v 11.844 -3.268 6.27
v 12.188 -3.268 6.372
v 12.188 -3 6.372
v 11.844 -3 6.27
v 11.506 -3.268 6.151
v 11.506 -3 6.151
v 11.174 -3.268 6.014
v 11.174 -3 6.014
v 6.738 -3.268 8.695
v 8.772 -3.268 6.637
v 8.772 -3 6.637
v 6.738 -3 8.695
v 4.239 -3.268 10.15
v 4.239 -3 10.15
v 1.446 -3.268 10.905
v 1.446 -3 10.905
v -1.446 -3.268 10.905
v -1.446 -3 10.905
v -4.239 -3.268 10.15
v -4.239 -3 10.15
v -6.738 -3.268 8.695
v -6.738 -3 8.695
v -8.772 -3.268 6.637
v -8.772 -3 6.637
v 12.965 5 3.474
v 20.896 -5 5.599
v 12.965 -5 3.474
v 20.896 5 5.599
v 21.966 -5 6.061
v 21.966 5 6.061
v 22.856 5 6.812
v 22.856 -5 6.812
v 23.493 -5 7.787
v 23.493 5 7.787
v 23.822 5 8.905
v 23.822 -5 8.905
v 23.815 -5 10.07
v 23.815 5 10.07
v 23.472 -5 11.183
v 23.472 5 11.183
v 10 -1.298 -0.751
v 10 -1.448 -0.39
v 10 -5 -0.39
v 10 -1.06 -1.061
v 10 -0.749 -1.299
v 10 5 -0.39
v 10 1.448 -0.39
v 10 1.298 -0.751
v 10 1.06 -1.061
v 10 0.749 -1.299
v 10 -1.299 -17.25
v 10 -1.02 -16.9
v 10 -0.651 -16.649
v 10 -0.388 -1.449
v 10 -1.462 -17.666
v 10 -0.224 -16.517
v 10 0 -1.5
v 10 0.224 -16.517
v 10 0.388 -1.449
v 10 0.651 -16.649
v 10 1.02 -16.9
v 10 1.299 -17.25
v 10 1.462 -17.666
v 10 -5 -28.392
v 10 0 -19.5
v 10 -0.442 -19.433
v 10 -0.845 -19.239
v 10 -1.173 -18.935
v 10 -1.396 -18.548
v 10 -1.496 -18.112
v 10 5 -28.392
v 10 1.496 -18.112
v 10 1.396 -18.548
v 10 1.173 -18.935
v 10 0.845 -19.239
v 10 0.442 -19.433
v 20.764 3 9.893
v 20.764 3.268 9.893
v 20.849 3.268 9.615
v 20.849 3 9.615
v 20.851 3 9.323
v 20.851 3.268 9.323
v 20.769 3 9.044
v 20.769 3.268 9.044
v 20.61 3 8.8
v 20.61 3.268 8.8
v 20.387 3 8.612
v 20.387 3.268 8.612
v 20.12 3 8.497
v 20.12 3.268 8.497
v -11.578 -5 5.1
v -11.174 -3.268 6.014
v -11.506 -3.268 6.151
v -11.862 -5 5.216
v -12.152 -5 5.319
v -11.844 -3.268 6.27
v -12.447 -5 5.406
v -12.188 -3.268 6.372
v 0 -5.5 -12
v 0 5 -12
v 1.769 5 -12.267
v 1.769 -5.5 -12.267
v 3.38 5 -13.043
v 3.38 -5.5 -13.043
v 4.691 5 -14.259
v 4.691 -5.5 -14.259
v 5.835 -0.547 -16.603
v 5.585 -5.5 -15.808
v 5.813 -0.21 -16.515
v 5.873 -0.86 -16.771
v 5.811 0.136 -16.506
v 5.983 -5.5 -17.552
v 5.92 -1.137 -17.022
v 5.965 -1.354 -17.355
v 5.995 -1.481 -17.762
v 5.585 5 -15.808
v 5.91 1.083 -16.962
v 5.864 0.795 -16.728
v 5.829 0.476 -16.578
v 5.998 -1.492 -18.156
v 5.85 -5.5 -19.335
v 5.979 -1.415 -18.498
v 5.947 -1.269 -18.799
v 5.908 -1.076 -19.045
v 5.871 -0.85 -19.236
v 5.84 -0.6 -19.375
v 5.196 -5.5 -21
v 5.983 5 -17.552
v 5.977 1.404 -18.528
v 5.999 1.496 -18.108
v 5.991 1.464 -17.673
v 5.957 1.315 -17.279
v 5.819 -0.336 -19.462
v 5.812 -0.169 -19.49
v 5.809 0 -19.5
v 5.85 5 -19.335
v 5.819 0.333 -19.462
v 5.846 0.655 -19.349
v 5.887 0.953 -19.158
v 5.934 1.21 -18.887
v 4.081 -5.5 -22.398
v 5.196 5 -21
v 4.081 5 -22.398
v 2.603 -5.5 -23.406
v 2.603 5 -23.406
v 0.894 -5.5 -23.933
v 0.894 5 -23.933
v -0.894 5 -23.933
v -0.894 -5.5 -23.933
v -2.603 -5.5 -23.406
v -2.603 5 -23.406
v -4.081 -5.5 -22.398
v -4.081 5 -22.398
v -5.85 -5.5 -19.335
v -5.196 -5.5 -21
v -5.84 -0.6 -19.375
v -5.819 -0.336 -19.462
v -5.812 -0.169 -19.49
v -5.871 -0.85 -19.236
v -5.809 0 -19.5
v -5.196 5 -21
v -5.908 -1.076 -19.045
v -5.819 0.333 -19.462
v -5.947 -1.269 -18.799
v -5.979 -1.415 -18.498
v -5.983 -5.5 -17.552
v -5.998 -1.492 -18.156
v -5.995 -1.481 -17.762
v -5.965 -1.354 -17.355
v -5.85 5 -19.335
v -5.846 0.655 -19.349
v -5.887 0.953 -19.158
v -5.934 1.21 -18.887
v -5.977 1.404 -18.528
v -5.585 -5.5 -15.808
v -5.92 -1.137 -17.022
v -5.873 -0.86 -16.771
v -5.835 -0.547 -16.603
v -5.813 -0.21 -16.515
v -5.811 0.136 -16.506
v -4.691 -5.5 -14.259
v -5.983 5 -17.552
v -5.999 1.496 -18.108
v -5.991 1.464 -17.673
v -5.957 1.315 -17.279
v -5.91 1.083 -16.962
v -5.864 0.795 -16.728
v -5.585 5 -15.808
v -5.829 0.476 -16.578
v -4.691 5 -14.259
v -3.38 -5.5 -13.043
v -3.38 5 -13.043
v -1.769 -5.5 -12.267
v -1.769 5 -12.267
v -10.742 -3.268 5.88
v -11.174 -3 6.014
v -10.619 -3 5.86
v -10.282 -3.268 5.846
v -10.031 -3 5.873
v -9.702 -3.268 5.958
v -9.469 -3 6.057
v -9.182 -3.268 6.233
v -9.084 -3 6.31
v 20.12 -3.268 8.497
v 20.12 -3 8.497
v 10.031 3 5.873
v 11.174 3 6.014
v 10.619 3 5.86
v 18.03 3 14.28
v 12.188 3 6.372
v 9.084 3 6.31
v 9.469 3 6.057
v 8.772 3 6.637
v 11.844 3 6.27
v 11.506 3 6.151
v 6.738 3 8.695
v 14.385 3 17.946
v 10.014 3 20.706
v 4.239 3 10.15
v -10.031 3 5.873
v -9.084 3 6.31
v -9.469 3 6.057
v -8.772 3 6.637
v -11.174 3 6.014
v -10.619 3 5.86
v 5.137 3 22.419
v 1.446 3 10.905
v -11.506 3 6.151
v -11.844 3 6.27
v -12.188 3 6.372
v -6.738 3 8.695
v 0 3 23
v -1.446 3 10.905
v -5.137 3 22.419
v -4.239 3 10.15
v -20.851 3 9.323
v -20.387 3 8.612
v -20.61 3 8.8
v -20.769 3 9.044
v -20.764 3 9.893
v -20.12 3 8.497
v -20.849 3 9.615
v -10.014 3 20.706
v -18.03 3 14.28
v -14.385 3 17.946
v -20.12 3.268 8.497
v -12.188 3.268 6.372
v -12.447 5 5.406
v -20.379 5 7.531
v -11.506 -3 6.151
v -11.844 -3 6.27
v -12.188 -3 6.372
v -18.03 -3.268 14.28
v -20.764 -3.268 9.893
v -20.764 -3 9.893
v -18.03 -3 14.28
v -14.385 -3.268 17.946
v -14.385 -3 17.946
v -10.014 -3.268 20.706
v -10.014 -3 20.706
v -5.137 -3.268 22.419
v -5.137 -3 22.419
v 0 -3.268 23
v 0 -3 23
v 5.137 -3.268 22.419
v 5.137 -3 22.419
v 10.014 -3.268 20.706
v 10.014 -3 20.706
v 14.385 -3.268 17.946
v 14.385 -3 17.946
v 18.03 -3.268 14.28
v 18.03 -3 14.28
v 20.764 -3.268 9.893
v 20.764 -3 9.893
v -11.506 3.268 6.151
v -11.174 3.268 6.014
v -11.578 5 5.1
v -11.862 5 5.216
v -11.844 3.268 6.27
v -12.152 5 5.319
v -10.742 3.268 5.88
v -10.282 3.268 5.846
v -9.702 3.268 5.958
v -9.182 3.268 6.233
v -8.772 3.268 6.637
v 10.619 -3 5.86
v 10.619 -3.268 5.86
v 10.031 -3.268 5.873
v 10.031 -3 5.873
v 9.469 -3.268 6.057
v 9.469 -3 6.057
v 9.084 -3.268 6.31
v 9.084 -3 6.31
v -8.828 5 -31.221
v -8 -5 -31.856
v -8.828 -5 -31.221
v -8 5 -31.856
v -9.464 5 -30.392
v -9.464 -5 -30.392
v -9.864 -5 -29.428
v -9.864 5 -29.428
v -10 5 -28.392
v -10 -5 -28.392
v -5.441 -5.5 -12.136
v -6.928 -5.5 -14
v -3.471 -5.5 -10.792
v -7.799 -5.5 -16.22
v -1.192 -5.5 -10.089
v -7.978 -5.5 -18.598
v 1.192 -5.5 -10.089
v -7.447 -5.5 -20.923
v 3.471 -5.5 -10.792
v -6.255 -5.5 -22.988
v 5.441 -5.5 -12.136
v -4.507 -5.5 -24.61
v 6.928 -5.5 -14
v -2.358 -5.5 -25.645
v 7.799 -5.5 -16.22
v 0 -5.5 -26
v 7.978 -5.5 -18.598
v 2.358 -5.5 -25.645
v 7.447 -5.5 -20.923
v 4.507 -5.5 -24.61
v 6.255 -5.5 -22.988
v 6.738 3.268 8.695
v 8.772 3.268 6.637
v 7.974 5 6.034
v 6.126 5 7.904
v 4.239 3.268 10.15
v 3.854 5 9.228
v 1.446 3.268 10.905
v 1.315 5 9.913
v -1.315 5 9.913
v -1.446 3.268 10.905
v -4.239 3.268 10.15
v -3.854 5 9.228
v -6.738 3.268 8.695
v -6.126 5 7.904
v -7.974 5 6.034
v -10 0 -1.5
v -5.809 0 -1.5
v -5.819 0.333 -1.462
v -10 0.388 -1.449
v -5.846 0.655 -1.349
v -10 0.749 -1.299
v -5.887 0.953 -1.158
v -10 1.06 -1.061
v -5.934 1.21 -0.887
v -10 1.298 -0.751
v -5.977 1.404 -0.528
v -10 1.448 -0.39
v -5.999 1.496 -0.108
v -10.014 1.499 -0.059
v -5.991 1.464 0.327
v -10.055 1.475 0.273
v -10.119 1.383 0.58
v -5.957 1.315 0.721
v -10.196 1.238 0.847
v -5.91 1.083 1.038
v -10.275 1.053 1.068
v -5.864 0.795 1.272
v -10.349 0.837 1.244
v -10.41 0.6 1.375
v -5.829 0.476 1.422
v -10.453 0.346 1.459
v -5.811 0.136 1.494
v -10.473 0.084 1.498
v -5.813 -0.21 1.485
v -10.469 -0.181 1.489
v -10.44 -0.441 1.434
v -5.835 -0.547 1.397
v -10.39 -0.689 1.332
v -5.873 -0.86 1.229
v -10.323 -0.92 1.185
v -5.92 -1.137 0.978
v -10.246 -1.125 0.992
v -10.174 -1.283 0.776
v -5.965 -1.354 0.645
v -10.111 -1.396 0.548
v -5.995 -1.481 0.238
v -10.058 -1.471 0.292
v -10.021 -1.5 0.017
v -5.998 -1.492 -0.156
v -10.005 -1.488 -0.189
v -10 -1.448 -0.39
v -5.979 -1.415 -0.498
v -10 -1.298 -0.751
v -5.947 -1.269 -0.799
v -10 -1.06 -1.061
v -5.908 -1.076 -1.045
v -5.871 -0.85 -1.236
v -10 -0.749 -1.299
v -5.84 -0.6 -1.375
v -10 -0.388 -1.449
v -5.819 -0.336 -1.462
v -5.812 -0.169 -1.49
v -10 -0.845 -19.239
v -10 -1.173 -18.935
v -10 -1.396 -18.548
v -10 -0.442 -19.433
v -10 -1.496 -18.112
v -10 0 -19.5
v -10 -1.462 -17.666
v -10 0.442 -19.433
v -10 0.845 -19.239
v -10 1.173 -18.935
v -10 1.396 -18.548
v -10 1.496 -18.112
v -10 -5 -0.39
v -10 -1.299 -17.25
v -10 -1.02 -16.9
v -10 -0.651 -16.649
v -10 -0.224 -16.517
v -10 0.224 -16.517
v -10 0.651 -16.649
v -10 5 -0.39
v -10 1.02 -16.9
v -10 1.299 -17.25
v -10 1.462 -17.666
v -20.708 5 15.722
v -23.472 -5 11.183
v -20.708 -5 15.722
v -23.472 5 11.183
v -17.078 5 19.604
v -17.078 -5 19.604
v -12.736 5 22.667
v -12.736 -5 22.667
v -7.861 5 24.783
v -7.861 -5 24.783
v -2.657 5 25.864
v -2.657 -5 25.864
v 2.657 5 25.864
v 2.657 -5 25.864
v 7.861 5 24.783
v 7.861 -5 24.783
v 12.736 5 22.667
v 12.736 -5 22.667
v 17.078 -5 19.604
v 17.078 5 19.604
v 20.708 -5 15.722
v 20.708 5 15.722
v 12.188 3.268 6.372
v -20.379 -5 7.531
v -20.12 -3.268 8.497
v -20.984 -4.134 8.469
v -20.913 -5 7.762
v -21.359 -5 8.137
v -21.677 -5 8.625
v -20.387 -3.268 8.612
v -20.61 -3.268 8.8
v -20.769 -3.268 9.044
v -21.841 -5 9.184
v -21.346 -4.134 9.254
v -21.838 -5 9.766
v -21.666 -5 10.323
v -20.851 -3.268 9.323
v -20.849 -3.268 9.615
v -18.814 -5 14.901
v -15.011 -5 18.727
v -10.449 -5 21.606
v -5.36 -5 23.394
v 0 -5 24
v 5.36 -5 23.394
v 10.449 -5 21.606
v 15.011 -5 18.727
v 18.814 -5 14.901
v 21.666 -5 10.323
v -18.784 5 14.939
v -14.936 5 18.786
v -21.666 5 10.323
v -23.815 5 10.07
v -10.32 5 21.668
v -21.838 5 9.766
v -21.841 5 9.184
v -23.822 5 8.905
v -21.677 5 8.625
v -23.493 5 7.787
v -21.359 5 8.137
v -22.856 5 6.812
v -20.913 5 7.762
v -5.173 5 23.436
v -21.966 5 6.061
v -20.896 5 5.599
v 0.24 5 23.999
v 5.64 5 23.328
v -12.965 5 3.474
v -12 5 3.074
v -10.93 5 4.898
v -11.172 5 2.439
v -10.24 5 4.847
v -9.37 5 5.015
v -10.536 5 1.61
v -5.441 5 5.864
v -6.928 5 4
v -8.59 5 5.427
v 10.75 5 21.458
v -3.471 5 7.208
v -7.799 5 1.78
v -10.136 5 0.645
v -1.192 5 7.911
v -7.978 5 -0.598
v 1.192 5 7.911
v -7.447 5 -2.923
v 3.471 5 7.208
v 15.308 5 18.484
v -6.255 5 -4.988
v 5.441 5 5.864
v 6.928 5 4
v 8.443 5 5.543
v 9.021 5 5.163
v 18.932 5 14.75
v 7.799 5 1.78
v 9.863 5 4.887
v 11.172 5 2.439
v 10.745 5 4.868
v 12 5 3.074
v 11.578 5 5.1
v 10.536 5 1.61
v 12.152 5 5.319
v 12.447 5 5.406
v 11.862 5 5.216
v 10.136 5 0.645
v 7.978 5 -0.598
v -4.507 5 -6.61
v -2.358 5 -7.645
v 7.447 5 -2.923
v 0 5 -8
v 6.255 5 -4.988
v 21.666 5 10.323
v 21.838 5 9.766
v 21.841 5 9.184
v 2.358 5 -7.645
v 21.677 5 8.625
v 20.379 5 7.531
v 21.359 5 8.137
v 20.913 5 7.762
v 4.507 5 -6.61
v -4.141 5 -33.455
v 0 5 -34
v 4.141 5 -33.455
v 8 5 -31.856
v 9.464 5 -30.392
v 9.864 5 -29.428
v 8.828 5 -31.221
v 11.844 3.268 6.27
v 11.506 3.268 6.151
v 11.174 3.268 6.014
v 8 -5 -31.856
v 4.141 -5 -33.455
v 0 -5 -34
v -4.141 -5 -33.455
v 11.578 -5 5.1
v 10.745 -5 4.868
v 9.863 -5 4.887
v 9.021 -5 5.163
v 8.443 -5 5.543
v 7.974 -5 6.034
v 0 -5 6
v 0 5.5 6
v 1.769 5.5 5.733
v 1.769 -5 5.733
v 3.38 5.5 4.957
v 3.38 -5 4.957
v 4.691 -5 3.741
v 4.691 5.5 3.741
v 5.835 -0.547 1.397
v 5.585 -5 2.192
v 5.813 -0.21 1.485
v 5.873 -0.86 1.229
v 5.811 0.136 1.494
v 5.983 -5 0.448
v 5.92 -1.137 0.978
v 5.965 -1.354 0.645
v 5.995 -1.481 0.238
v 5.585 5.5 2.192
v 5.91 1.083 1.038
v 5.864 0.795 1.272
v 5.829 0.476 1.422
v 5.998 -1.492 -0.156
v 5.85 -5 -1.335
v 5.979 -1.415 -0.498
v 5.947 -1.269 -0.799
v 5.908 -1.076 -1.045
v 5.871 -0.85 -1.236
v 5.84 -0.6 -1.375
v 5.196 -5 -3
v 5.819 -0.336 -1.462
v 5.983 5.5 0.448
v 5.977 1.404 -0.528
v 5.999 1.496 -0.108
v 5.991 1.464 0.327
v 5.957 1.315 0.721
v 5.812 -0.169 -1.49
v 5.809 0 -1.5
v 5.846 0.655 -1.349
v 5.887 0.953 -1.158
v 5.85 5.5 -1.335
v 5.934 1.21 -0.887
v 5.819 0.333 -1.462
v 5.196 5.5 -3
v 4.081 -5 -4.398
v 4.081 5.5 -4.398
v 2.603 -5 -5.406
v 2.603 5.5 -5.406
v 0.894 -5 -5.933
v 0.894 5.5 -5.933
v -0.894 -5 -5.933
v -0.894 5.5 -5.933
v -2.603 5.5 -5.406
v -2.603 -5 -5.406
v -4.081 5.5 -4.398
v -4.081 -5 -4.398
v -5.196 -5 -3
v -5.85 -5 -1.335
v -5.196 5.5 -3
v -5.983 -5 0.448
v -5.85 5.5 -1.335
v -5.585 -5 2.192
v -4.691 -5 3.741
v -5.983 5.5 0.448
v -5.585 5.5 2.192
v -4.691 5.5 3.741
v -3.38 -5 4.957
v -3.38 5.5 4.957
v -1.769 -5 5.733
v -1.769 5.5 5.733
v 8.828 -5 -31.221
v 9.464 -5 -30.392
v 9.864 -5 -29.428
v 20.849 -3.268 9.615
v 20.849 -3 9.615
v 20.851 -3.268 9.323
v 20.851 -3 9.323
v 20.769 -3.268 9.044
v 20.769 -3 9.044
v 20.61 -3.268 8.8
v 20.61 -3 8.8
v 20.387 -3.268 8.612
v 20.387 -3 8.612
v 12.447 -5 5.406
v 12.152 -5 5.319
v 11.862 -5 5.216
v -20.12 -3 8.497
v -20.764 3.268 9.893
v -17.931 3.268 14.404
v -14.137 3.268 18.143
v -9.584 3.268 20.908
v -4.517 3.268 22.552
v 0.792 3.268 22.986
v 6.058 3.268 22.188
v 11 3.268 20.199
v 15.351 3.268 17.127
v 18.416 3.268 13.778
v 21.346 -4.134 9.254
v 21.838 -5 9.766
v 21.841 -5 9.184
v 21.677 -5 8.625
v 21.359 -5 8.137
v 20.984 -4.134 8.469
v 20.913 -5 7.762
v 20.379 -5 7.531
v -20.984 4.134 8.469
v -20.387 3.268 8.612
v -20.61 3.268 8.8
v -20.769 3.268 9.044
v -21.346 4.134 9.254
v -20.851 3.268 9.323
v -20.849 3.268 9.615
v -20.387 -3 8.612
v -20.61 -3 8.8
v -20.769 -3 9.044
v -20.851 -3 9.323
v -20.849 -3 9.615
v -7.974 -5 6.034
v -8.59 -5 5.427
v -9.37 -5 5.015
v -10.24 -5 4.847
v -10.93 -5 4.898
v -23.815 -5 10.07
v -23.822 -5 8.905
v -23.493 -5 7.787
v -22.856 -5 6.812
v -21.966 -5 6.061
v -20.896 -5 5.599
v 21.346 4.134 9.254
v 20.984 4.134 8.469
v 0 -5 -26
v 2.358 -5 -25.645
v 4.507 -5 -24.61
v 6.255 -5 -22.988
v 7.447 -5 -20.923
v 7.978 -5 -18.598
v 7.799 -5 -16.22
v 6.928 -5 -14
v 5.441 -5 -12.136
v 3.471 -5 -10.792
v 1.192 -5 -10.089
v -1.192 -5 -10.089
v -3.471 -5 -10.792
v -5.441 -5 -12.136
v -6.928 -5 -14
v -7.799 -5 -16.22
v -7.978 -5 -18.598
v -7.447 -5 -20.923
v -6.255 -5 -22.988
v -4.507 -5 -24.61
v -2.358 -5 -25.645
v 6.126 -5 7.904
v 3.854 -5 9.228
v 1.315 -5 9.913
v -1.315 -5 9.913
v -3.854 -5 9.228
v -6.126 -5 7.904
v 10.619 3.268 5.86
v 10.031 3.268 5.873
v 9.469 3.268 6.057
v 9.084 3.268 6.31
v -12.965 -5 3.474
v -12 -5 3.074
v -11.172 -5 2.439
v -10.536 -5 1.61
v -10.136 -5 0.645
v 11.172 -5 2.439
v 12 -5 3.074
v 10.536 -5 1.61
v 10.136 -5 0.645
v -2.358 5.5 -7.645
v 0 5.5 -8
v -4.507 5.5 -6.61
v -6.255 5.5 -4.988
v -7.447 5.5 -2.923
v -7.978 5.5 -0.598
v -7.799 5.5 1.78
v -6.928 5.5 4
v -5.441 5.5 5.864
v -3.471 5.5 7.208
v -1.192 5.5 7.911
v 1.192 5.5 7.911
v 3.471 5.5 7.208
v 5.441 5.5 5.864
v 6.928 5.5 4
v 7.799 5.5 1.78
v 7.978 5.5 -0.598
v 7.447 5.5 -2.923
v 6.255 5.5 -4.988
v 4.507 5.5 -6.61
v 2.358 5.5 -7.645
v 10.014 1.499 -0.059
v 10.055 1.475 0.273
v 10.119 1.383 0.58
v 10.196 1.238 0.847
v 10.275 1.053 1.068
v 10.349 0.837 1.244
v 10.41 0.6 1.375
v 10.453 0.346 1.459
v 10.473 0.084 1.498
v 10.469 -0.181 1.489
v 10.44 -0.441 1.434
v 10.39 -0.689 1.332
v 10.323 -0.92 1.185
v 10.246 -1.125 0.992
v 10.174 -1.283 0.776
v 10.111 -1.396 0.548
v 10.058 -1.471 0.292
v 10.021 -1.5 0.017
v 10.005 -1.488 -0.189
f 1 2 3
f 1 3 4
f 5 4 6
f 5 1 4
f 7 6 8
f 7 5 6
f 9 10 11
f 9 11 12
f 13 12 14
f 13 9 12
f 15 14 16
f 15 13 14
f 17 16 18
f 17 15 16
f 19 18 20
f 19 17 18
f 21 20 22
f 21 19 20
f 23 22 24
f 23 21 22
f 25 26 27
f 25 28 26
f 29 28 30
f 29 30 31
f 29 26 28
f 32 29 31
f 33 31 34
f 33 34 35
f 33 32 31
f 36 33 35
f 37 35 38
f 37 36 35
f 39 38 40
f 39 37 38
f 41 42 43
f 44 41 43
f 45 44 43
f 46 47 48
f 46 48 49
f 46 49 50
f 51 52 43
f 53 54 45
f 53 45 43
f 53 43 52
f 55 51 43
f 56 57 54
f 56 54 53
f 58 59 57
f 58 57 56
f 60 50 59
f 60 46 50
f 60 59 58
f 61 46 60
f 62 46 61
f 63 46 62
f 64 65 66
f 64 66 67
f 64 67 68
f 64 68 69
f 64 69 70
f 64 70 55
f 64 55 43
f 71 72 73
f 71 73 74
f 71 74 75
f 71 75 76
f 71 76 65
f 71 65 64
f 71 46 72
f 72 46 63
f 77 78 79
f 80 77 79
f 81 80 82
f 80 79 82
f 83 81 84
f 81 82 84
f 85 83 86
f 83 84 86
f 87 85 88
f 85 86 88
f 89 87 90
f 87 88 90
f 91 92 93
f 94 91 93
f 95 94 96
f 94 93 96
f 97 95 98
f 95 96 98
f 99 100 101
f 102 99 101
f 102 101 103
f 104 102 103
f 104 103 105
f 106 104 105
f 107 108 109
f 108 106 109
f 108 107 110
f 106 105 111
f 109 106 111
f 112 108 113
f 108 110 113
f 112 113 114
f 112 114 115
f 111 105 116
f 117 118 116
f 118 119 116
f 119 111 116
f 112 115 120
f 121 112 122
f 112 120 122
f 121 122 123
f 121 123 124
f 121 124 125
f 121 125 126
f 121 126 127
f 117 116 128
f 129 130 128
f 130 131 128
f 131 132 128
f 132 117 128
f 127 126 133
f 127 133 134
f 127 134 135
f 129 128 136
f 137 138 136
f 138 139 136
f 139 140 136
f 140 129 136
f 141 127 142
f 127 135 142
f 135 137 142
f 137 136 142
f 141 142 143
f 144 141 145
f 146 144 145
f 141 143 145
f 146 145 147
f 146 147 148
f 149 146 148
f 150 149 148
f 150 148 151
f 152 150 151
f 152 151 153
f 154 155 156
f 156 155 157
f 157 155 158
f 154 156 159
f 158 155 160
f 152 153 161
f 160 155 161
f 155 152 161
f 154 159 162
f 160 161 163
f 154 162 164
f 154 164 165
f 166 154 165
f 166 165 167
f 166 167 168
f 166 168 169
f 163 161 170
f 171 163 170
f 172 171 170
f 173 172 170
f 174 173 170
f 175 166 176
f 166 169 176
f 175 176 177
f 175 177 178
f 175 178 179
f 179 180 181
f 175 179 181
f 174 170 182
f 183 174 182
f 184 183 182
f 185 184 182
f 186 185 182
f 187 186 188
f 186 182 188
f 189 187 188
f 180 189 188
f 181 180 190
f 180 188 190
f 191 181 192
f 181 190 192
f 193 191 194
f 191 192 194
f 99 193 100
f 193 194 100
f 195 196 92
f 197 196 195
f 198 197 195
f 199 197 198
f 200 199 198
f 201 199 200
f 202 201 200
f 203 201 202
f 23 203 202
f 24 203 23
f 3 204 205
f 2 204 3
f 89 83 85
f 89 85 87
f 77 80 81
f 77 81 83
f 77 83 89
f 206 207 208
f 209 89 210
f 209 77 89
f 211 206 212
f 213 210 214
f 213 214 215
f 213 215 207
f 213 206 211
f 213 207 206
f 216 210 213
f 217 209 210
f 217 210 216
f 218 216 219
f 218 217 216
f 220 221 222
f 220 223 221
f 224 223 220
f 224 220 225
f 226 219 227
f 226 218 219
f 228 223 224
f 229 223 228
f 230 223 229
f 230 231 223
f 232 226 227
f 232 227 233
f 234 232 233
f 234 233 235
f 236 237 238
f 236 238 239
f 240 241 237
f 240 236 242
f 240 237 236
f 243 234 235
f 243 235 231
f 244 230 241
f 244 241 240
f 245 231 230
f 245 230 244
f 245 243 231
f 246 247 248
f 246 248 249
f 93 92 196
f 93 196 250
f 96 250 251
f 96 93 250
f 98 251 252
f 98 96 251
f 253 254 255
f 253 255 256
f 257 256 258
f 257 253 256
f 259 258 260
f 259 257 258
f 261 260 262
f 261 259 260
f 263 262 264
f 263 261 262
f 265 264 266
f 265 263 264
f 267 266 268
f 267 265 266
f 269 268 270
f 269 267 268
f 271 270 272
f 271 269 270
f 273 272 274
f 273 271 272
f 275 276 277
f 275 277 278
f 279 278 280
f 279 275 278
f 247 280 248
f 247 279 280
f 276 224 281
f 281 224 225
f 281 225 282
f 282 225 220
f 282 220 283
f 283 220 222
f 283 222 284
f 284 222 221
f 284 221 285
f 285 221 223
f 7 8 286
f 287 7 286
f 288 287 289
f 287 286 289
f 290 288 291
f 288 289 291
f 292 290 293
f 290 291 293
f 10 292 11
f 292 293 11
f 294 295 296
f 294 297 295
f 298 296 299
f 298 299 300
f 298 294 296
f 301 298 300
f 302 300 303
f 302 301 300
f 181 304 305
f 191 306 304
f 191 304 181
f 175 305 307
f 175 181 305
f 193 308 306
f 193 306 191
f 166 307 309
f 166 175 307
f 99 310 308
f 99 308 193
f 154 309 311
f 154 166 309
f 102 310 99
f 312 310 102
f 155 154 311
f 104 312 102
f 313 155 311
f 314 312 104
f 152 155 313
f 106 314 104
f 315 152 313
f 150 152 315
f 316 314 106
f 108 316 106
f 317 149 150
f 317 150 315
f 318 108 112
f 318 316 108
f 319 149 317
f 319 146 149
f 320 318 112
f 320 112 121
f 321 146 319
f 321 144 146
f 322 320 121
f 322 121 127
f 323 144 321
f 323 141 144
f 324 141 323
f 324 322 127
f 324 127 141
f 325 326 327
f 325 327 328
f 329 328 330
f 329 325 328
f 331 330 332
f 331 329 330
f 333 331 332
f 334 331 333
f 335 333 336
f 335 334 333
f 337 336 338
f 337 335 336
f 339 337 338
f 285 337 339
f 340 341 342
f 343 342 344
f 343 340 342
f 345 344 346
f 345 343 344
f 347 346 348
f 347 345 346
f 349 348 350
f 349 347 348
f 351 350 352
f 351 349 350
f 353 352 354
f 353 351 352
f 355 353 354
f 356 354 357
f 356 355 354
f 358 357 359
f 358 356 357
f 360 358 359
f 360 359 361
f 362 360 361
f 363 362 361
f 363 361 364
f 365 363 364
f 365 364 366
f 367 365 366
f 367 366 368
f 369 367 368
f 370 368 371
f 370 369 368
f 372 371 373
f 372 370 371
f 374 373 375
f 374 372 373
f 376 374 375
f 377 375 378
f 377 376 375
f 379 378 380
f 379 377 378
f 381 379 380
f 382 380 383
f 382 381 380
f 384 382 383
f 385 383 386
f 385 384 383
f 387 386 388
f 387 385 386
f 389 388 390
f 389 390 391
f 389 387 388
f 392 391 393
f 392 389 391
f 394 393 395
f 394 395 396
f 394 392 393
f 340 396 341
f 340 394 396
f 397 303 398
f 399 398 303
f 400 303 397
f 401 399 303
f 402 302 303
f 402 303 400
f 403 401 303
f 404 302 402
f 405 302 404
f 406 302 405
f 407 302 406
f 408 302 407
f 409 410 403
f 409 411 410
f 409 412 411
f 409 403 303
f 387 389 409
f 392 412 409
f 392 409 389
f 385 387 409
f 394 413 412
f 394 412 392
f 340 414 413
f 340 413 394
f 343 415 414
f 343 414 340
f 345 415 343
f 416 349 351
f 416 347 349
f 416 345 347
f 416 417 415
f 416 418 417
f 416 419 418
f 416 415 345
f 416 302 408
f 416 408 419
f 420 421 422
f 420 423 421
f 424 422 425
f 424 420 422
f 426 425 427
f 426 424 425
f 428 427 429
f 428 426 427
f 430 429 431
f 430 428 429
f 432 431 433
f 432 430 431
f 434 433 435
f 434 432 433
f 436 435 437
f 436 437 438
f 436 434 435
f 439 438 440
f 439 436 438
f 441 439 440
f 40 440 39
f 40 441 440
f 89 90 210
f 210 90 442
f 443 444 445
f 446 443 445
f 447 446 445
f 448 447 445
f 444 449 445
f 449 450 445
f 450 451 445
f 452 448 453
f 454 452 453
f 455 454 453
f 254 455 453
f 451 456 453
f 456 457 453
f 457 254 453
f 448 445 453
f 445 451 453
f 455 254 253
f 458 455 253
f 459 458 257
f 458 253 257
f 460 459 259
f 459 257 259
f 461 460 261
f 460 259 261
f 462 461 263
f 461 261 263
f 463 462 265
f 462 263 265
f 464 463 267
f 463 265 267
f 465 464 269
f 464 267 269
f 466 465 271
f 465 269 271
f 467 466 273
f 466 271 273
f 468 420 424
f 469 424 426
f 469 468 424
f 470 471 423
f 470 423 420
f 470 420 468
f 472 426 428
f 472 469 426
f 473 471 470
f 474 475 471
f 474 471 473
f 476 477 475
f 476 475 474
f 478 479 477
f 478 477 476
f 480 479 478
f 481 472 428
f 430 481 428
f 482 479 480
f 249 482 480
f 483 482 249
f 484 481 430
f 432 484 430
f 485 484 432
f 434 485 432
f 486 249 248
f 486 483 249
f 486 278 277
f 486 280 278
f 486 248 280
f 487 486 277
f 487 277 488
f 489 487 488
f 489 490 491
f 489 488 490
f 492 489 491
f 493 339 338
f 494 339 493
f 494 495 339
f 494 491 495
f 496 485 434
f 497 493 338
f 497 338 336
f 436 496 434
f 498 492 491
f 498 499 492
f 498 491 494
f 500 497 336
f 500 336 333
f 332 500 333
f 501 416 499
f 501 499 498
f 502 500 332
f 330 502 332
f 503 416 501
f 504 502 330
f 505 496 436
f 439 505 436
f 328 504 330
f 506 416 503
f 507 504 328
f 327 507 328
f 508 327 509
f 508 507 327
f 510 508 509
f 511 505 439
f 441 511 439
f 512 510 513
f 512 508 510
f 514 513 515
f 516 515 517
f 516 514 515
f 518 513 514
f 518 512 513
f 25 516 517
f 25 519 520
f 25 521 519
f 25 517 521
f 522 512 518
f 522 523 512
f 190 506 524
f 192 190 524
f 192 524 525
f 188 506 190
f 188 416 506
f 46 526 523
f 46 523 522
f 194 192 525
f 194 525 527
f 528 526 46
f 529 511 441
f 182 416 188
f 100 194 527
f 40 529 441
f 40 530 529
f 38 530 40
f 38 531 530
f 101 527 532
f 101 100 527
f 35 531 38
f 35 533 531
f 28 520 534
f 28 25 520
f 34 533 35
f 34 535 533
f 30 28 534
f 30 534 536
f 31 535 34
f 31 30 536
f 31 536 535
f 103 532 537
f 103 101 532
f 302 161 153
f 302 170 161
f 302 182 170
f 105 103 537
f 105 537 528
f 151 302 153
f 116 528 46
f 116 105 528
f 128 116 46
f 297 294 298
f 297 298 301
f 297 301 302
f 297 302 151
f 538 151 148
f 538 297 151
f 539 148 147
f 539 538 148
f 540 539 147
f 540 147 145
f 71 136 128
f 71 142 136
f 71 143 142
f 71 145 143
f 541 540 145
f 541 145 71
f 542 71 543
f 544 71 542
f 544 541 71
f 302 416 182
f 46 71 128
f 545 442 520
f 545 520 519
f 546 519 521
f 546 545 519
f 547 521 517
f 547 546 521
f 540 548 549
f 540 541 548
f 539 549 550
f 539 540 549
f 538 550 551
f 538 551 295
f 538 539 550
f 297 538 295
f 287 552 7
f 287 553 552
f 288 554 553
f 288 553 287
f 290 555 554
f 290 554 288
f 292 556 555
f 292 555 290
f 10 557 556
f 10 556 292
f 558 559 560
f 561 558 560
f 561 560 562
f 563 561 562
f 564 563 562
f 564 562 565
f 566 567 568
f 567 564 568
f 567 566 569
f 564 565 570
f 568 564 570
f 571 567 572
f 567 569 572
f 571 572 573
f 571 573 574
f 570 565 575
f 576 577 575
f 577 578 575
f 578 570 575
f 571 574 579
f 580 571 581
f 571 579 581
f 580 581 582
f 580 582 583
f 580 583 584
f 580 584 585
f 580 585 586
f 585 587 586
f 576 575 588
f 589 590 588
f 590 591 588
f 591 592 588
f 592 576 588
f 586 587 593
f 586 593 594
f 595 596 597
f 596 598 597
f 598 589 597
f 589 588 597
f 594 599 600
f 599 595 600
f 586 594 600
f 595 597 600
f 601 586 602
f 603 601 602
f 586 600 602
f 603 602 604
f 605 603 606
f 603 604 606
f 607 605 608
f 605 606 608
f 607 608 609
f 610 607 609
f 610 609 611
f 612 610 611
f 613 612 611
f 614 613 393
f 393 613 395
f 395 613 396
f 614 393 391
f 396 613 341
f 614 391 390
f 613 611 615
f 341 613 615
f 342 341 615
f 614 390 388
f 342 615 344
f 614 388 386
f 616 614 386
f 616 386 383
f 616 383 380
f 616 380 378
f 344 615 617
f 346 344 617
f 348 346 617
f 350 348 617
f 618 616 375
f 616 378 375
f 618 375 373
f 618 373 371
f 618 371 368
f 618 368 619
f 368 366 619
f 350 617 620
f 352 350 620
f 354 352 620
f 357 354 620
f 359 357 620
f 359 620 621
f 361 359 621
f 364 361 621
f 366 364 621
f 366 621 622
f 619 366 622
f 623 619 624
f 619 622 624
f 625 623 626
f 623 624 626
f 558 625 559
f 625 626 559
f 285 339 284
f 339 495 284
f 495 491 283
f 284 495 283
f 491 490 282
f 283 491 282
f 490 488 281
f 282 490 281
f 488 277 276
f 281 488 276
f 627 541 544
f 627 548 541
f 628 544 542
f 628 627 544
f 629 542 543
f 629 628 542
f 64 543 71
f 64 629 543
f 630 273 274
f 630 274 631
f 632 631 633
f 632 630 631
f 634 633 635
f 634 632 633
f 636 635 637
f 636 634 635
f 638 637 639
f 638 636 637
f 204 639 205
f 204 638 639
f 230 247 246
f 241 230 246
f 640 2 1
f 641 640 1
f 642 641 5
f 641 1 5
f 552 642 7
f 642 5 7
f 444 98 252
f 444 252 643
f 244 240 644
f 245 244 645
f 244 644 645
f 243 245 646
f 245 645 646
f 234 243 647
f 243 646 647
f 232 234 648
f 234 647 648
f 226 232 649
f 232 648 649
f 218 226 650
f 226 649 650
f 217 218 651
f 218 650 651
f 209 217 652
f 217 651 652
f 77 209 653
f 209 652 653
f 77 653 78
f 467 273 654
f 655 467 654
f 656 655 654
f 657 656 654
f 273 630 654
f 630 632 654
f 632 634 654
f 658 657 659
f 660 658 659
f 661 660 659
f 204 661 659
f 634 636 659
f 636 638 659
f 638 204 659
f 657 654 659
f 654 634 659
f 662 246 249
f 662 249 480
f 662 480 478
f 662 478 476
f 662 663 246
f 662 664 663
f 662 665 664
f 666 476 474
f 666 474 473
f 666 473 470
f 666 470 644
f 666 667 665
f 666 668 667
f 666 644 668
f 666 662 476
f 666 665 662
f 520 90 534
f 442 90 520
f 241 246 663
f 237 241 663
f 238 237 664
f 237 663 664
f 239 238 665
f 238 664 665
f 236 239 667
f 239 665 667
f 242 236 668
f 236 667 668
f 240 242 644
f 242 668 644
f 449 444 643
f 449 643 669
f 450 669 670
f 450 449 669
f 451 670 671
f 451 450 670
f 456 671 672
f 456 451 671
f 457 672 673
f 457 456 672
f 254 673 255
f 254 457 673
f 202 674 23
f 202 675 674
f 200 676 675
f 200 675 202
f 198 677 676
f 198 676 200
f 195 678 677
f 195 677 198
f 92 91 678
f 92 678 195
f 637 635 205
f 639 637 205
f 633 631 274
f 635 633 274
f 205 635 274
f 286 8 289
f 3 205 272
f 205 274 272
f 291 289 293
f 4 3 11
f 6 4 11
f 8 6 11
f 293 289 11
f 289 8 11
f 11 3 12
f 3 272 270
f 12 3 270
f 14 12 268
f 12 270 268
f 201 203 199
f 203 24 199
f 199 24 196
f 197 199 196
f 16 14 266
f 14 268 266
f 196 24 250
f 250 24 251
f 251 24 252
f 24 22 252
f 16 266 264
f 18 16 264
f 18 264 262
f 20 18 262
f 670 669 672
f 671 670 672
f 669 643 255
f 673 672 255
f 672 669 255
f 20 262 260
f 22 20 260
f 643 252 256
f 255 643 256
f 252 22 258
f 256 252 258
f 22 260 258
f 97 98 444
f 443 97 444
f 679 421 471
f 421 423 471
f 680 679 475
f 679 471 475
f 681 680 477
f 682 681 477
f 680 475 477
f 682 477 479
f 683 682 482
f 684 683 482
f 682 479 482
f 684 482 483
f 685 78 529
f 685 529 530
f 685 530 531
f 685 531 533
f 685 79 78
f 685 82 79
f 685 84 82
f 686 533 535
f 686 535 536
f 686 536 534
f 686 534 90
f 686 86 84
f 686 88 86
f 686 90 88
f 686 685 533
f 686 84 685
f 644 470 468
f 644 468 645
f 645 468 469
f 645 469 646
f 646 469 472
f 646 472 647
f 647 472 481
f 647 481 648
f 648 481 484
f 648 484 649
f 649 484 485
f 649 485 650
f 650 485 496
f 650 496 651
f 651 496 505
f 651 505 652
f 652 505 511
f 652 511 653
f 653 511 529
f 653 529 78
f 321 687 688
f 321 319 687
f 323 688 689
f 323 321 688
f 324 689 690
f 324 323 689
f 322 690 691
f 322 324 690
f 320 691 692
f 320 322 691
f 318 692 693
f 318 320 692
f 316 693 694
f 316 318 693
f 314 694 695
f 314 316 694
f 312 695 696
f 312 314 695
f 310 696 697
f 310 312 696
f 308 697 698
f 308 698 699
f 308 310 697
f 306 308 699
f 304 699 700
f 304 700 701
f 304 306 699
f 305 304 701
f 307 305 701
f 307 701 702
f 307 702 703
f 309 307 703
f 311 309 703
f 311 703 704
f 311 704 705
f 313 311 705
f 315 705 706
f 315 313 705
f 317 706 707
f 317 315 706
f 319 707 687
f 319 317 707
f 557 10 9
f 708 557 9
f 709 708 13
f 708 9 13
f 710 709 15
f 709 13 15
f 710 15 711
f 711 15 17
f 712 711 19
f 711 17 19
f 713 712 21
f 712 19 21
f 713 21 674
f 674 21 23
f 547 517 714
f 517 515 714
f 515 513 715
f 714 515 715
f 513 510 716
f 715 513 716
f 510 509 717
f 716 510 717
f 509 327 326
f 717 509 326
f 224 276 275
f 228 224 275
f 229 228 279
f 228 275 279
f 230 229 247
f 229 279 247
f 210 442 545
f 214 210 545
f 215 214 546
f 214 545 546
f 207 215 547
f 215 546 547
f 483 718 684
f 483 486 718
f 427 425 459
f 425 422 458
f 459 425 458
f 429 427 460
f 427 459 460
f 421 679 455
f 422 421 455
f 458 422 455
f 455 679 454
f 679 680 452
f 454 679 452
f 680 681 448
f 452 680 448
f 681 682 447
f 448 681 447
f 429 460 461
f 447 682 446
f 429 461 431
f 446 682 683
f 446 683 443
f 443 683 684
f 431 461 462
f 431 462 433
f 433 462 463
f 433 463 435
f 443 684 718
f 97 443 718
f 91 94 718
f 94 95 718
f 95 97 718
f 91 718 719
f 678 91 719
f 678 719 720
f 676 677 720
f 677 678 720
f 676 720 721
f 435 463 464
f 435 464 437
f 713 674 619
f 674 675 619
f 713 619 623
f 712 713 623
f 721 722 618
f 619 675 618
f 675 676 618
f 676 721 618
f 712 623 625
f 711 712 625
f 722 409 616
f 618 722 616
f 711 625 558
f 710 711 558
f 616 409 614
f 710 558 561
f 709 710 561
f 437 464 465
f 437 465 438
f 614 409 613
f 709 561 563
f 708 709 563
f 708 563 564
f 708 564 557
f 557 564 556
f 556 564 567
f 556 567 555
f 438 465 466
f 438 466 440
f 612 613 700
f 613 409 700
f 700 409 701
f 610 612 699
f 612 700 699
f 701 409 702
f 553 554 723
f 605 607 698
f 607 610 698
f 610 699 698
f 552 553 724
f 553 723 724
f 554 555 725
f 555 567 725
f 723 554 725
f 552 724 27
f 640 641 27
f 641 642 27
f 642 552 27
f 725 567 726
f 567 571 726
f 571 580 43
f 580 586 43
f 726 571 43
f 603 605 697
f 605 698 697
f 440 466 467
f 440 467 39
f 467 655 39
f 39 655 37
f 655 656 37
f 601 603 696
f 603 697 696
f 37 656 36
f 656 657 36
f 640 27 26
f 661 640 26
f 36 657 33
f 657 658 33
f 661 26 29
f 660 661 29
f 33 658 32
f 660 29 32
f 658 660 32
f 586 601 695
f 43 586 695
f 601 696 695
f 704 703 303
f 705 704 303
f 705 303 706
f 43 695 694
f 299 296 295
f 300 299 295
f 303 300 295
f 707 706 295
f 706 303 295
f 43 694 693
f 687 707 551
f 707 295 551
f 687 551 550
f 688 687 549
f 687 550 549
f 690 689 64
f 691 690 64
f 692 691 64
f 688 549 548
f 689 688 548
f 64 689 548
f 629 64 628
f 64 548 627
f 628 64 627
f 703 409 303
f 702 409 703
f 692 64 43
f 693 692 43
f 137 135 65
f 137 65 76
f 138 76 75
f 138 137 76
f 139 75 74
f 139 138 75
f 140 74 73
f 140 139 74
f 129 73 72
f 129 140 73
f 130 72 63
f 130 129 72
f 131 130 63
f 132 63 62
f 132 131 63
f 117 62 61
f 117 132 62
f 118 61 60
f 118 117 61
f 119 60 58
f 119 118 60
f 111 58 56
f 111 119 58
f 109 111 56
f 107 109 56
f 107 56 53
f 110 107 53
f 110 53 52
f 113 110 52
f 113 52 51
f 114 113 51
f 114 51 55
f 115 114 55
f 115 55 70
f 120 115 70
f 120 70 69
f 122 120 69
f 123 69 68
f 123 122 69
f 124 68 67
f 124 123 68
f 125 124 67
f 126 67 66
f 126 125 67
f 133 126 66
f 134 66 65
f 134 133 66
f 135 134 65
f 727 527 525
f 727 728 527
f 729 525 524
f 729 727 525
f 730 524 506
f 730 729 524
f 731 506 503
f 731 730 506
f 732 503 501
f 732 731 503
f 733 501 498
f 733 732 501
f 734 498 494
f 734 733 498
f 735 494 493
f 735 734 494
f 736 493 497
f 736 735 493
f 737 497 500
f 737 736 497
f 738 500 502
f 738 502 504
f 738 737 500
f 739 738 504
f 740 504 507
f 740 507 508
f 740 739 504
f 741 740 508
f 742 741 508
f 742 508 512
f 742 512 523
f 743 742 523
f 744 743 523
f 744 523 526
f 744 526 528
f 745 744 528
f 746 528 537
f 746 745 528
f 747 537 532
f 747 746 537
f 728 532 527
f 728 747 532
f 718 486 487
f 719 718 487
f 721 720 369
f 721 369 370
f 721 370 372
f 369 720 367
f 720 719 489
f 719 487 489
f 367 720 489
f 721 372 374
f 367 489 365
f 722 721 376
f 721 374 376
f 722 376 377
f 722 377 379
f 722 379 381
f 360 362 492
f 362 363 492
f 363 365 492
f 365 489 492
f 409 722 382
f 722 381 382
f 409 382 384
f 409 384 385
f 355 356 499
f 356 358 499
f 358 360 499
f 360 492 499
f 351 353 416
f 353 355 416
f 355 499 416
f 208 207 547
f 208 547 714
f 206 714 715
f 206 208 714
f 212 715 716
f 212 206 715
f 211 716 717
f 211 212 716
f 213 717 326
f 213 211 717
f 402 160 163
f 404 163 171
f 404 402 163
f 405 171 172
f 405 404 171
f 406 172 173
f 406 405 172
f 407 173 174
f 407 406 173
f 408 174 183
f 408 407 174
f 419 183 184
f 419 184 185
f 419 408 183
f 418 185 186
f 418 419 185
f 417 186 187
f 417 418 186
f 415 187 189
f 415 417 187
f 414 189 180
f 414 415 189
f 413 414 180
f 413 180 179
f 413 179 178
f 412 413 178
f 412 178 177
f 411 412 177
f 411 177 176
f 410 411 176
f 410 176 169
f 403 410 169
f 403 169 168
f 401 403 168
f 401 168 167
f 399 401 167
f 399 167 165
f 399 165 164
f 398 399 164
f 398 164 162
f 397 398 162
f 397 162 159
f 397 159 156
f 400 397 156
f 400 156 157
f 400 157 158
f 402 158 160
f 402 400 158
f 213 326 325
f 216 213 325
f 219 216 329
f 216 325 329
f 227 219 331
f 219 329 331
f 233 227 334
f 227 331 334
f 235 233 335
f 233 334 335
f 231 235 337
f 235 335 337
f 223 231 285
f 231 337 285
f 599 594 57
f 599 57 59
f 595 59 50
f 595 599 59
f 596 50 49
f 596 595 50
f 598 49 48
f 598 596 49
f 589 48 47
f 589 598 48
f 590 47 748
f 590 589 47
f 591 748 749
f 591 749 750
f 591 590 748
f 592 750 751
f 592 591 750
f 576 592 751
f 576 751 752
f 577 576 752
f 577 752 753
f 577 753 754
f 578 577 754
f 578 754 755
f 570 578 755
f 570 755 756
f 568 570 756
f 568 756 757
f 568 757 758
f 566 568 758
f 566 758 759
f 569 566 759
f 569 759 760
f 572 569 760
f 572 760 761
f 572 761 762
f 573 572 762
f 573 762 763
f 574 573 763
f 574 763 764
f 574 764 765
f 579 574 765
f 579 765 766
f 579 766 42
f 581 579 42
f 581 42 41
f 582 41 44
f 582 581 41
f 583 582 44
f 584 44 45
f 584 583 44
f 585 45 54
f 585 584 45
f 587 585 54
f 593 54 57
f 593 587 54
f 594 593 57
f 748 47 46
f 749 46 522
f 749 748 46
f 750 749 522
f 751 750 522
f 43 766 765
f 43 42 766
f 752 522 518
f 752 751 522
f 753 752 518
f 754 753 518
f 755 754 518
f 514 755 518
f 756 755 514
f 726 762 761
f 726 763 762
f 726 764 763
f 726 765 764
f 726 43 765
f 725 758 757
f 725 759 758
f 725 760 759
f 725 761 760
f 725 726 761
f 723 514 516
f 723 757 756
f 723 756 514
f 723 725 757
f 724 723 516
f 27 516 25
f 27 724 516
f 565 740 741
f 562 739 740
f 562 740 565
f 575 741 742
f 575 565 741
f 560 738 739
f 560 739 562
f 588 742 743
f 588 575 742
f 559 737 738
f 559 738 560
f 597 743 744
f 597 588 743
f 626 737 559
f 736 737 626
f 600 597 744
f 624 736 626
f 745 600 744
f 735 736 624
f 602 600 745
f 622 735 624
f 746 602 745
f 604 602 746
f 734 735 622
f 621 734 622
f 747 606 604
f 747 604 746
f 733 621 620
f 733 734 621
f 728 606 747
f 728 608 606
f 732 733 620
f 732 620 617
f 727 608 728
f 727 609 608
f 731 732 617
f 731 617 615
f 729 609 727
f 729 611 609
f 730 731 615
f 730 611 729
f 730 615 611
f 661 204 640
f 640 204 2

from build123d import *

# Parameters (mm, degrees)
BOSS_EXTRUDE1_DEPTH       = 5
FILLET1_R                 = 4
SKETCH2_R                 = 8
BOSS_EXTRUDE2_DEPTH       = 0.5
SKETCH3_R                 = 8
BOSS_EXTRUDE3_DEPTH       = 0.5
SKETCH4_R                 = 6
CUT_EXTRUDE1_DEPTH        = 43.969085178
CUT_EXTRUDE2_DEPTH        = 2
FILLET3_R                 = 2
CHAMFER1_SIZE             = 1
CHAMFER1_SIZE2            = 1.732050808
FILLET3_OF_MIRROR9_R      = 2
CHAMFER1_OF_MIRROR9_SIZE2 = 1.732050808
CHAMFER1_OF_MIRROR9_SIZE  = 1
CUT_EXTRUDE3_DEPTH        = 42.899788694
CUT_EXTRUDE3_DEPTH_BACK   = 42.899788694
SKETCH7_R                 = 1.5


with BuildPart() as part:
    # Sketch1 → Boss-Extrude1 (new, symmetric)
    with BuildSketch(Plane(origin=(0, 0, 0), x_dir=(1, 0, 0), z_dir=(0, 1, 0))):
        with BuildLine():
            Line((10, 0), (10, 30.489995997))
            ThreePointArc((10, 30.489995997), (0, 34), (-10, 30.489995997))
            Line((-10, 30.489995997), (-10, 0))
            Line((-10, 0), (-10, -2.679491924))
            Line((-10, -2.679491924), (-25.114071484, -6.729295173))
            ThreePointArc((-25.114071484, -6.729295173), (0, -26), (25.114071484, -6.729295173))
            Line((25.114071484, -6.729295173), (10, -2.679491924))
            Line((10, -2.679491924), (10, 0))
        make_face()
    extrude(amount=BOSS_EXTRUDE1_DEPTH, both=True)

    # Fillet1
    fillet1_edges = [part.edges().sort_by_distance(p)[0] for p in [
        (10, 0, 2.679491924),
        (25.114071484, 0, 6.729295173),
        (-25.114071484, 0, 6.729295173),
        (-10, 0, 2.679491924),
        (-10, 0, -30.489995997),
        (10, 0, -30.489995997),
    ]]
    fillet(fillet1_edges, radius=FILLET1_R)

    # Sketch2 → Boss-Extrude2 (add, symmetric)
    with BuildSketch(Plane(origin=(0, 5, 0), x_dir=(1, 0, 0), z_dir=(0, 1, 0))):
        with Locations(Location((0, 0, 0), (0, 0, 90))):
            Circle(SKETCH2_R)
    extrude(amount=BOSS_EXTRUDE2_DEPTH, both=True)

    # Sketch3 → Boss-Extrude3 (add, symmetric)
    with BuildSketch(Plane.XZ.offset(5)):
        with Locations(Location((0, -18, 0), (0, 0, 270))):
            Circle(SKETCH3_R)
    extrude(amount=BOSS_EXTRUDE3_DEPTH, both=True)

    # Sketch4 → Cut-Extrude1 (cut, through all)
    with BuildSketch(Plane(origin=(0, 5.5, 0), x_dir=(1, 0, 0), z_dir=(0, 1, 0))):
        with Locations(Location((0, 0, 0), (0, 0, 270))):
            Circle(SKETCH4_R)
        with Locations(Location((0, 18, 0), (0, 0, 270))):
            Circle(SKETCH4_R)
    extrude(amount=-CUT_EXTRUDE1_DEPTH, mode=Mode.SUBTRACT)

    # Sketch5 → Cut-Extrude2 (cut)
    with BuildSketch(Plane.XZ.offset(5)):
        with BuildLine():
            ThreePointArc((-9.720237296, 5.14946472), (-10.893551196, 5.883139881), (-12.188266684, 6.371664756))
            Line((-12.188266684, 6.371664756), (-20.119713435, 8.496889508))
            ThreePointArc((-20.119713435, 8.496889508), (-20.768948696, 9.043962883), (-20.763662316, 9.892943304))
            ThreePointArc((-20.763662316, 9.892943304), (0, 23), (20.763662316, 9.892943304))
            ThreePointArc((20.763662316, 9.892943304), (20.768948696, 9.043962883), (20.119713435, 8.496889508))
            Line((20.119713435, 8.496889508), (12.188266684, 6.371664756))
            ThreePointArc((12.188266684, 6.371664756), (10.893551196, 5.883139881), (9.720237296, 5.14946472))
            ThreePointArc((9.720237296, 5.14946472), (0, 11), (-9.720237296, 5.14946472))
        make_face()
    cut_extrude2 = extrude(amount=-CUT_EXTRUDE2_DEPTH, mode=Mode.SUBTRACT)

    # Fillet3
    fillet3_edges = [part.edges().sort_by_distance(p)[0] for p in [
        (-9.720237296, -4, 5.14946472),
        (9.720237296, -4, 5.14946472),
    ]]
    fillet(fillet3_edges, radius=FILLET3_R)

    # Chamfer1
    chamfer1_edges = [part.edges().sort_by_distance(p)[0] for p in [
        (0, -5, 11),
        (-11.674313174, -5, 6.212545731),
        (-9.864646178, -5, 5.908245307),
        (9.864646178, -5, 5.908245307),
        (-16.153990059, -5, 7.434277132),
        (16.153990059, -5, 7.434277132),
        (11.674313174, -5, 6.212545731),
        (20.768948696, -5, 9.043962883),
        (0, -5, 23),
        (-20.768948696, -5, 9.043962883),
    ]]
    chamfer1_side = [part.faces().sort_by_distance(p)[0] for p in [
        (-11.929022401, -5, 5.489455054),
    ]]
    chamfer(chamfer1_edges, length=CHAMFER1_SIZE, length2=CHAMFER1_SIZE2, reference=chamfer1_side[0])

    # Mirror9: Cut-Extrude2 across plane
    add(cut_extrude2.mirror(Plane.ZX), mode=Mode.SUBTRACT)

    # Fillet3 of Mirror9
    fillet3_of_mirror9_edges = [part.edges().sort_by_distance(p)[0] for p in [
        (-9.720237296, 4, 5.14946472),
        (9.720237296, 4, 5.14946472),
    ]]
    fillet(fillet3_of_mirror9_edges, radius=FILLET3_OF_MIRROR9_R)

    # Chamfer1 of Mirror9
    chamfer1_of_mirror9_edges = [part.edges().sort_by_distance(p)[0] for p in [
        (0, 5, 11),
        (-11.674313174, 5, 6.212545731),
        (-9.864646178, 5, 5.908245307),
        (9.864646178, 5, 5.908245307),
        (-16.153990059, 5, 7.434277132),
        (16.153990059, 5, 7.434277132),
        (11.674313174, 5, 6.212545731),
        (20.768948696, 5, 9.043962883),
        (0, 5, 23),
        (-20.768948696, 5, 9.043962883),
    ]]
    chamfer(chamfer1_of_mirror9_edges, length=CHAMFER1_OF_MIRROR9_SIZE, length2=CHAMFER1_OF_MIRROR9_SIZE2)

    # Sketch7 → Cut-Extrude3 (cut, two sides: drawn at the far end of the back side and taken through both)
    with BuildSketch(Plane(origin=(0, 0, 0), x_dir=(0, 0, -1), z_dir=(1, 0, 0)).offset(-CUT_EXTRUDE3_DEPTH_BACK)):
        with Locations((18, 0)):
            Circle(SKETCH7_R)
        Circle(SKETCH7_R)
    extrude(amount=CUT_EXTRUDE3_DEPTH + CUT_EXTRUDE3_DEPTH_BACK, mode=Mode.SUBTRACT)


solid = part.part
